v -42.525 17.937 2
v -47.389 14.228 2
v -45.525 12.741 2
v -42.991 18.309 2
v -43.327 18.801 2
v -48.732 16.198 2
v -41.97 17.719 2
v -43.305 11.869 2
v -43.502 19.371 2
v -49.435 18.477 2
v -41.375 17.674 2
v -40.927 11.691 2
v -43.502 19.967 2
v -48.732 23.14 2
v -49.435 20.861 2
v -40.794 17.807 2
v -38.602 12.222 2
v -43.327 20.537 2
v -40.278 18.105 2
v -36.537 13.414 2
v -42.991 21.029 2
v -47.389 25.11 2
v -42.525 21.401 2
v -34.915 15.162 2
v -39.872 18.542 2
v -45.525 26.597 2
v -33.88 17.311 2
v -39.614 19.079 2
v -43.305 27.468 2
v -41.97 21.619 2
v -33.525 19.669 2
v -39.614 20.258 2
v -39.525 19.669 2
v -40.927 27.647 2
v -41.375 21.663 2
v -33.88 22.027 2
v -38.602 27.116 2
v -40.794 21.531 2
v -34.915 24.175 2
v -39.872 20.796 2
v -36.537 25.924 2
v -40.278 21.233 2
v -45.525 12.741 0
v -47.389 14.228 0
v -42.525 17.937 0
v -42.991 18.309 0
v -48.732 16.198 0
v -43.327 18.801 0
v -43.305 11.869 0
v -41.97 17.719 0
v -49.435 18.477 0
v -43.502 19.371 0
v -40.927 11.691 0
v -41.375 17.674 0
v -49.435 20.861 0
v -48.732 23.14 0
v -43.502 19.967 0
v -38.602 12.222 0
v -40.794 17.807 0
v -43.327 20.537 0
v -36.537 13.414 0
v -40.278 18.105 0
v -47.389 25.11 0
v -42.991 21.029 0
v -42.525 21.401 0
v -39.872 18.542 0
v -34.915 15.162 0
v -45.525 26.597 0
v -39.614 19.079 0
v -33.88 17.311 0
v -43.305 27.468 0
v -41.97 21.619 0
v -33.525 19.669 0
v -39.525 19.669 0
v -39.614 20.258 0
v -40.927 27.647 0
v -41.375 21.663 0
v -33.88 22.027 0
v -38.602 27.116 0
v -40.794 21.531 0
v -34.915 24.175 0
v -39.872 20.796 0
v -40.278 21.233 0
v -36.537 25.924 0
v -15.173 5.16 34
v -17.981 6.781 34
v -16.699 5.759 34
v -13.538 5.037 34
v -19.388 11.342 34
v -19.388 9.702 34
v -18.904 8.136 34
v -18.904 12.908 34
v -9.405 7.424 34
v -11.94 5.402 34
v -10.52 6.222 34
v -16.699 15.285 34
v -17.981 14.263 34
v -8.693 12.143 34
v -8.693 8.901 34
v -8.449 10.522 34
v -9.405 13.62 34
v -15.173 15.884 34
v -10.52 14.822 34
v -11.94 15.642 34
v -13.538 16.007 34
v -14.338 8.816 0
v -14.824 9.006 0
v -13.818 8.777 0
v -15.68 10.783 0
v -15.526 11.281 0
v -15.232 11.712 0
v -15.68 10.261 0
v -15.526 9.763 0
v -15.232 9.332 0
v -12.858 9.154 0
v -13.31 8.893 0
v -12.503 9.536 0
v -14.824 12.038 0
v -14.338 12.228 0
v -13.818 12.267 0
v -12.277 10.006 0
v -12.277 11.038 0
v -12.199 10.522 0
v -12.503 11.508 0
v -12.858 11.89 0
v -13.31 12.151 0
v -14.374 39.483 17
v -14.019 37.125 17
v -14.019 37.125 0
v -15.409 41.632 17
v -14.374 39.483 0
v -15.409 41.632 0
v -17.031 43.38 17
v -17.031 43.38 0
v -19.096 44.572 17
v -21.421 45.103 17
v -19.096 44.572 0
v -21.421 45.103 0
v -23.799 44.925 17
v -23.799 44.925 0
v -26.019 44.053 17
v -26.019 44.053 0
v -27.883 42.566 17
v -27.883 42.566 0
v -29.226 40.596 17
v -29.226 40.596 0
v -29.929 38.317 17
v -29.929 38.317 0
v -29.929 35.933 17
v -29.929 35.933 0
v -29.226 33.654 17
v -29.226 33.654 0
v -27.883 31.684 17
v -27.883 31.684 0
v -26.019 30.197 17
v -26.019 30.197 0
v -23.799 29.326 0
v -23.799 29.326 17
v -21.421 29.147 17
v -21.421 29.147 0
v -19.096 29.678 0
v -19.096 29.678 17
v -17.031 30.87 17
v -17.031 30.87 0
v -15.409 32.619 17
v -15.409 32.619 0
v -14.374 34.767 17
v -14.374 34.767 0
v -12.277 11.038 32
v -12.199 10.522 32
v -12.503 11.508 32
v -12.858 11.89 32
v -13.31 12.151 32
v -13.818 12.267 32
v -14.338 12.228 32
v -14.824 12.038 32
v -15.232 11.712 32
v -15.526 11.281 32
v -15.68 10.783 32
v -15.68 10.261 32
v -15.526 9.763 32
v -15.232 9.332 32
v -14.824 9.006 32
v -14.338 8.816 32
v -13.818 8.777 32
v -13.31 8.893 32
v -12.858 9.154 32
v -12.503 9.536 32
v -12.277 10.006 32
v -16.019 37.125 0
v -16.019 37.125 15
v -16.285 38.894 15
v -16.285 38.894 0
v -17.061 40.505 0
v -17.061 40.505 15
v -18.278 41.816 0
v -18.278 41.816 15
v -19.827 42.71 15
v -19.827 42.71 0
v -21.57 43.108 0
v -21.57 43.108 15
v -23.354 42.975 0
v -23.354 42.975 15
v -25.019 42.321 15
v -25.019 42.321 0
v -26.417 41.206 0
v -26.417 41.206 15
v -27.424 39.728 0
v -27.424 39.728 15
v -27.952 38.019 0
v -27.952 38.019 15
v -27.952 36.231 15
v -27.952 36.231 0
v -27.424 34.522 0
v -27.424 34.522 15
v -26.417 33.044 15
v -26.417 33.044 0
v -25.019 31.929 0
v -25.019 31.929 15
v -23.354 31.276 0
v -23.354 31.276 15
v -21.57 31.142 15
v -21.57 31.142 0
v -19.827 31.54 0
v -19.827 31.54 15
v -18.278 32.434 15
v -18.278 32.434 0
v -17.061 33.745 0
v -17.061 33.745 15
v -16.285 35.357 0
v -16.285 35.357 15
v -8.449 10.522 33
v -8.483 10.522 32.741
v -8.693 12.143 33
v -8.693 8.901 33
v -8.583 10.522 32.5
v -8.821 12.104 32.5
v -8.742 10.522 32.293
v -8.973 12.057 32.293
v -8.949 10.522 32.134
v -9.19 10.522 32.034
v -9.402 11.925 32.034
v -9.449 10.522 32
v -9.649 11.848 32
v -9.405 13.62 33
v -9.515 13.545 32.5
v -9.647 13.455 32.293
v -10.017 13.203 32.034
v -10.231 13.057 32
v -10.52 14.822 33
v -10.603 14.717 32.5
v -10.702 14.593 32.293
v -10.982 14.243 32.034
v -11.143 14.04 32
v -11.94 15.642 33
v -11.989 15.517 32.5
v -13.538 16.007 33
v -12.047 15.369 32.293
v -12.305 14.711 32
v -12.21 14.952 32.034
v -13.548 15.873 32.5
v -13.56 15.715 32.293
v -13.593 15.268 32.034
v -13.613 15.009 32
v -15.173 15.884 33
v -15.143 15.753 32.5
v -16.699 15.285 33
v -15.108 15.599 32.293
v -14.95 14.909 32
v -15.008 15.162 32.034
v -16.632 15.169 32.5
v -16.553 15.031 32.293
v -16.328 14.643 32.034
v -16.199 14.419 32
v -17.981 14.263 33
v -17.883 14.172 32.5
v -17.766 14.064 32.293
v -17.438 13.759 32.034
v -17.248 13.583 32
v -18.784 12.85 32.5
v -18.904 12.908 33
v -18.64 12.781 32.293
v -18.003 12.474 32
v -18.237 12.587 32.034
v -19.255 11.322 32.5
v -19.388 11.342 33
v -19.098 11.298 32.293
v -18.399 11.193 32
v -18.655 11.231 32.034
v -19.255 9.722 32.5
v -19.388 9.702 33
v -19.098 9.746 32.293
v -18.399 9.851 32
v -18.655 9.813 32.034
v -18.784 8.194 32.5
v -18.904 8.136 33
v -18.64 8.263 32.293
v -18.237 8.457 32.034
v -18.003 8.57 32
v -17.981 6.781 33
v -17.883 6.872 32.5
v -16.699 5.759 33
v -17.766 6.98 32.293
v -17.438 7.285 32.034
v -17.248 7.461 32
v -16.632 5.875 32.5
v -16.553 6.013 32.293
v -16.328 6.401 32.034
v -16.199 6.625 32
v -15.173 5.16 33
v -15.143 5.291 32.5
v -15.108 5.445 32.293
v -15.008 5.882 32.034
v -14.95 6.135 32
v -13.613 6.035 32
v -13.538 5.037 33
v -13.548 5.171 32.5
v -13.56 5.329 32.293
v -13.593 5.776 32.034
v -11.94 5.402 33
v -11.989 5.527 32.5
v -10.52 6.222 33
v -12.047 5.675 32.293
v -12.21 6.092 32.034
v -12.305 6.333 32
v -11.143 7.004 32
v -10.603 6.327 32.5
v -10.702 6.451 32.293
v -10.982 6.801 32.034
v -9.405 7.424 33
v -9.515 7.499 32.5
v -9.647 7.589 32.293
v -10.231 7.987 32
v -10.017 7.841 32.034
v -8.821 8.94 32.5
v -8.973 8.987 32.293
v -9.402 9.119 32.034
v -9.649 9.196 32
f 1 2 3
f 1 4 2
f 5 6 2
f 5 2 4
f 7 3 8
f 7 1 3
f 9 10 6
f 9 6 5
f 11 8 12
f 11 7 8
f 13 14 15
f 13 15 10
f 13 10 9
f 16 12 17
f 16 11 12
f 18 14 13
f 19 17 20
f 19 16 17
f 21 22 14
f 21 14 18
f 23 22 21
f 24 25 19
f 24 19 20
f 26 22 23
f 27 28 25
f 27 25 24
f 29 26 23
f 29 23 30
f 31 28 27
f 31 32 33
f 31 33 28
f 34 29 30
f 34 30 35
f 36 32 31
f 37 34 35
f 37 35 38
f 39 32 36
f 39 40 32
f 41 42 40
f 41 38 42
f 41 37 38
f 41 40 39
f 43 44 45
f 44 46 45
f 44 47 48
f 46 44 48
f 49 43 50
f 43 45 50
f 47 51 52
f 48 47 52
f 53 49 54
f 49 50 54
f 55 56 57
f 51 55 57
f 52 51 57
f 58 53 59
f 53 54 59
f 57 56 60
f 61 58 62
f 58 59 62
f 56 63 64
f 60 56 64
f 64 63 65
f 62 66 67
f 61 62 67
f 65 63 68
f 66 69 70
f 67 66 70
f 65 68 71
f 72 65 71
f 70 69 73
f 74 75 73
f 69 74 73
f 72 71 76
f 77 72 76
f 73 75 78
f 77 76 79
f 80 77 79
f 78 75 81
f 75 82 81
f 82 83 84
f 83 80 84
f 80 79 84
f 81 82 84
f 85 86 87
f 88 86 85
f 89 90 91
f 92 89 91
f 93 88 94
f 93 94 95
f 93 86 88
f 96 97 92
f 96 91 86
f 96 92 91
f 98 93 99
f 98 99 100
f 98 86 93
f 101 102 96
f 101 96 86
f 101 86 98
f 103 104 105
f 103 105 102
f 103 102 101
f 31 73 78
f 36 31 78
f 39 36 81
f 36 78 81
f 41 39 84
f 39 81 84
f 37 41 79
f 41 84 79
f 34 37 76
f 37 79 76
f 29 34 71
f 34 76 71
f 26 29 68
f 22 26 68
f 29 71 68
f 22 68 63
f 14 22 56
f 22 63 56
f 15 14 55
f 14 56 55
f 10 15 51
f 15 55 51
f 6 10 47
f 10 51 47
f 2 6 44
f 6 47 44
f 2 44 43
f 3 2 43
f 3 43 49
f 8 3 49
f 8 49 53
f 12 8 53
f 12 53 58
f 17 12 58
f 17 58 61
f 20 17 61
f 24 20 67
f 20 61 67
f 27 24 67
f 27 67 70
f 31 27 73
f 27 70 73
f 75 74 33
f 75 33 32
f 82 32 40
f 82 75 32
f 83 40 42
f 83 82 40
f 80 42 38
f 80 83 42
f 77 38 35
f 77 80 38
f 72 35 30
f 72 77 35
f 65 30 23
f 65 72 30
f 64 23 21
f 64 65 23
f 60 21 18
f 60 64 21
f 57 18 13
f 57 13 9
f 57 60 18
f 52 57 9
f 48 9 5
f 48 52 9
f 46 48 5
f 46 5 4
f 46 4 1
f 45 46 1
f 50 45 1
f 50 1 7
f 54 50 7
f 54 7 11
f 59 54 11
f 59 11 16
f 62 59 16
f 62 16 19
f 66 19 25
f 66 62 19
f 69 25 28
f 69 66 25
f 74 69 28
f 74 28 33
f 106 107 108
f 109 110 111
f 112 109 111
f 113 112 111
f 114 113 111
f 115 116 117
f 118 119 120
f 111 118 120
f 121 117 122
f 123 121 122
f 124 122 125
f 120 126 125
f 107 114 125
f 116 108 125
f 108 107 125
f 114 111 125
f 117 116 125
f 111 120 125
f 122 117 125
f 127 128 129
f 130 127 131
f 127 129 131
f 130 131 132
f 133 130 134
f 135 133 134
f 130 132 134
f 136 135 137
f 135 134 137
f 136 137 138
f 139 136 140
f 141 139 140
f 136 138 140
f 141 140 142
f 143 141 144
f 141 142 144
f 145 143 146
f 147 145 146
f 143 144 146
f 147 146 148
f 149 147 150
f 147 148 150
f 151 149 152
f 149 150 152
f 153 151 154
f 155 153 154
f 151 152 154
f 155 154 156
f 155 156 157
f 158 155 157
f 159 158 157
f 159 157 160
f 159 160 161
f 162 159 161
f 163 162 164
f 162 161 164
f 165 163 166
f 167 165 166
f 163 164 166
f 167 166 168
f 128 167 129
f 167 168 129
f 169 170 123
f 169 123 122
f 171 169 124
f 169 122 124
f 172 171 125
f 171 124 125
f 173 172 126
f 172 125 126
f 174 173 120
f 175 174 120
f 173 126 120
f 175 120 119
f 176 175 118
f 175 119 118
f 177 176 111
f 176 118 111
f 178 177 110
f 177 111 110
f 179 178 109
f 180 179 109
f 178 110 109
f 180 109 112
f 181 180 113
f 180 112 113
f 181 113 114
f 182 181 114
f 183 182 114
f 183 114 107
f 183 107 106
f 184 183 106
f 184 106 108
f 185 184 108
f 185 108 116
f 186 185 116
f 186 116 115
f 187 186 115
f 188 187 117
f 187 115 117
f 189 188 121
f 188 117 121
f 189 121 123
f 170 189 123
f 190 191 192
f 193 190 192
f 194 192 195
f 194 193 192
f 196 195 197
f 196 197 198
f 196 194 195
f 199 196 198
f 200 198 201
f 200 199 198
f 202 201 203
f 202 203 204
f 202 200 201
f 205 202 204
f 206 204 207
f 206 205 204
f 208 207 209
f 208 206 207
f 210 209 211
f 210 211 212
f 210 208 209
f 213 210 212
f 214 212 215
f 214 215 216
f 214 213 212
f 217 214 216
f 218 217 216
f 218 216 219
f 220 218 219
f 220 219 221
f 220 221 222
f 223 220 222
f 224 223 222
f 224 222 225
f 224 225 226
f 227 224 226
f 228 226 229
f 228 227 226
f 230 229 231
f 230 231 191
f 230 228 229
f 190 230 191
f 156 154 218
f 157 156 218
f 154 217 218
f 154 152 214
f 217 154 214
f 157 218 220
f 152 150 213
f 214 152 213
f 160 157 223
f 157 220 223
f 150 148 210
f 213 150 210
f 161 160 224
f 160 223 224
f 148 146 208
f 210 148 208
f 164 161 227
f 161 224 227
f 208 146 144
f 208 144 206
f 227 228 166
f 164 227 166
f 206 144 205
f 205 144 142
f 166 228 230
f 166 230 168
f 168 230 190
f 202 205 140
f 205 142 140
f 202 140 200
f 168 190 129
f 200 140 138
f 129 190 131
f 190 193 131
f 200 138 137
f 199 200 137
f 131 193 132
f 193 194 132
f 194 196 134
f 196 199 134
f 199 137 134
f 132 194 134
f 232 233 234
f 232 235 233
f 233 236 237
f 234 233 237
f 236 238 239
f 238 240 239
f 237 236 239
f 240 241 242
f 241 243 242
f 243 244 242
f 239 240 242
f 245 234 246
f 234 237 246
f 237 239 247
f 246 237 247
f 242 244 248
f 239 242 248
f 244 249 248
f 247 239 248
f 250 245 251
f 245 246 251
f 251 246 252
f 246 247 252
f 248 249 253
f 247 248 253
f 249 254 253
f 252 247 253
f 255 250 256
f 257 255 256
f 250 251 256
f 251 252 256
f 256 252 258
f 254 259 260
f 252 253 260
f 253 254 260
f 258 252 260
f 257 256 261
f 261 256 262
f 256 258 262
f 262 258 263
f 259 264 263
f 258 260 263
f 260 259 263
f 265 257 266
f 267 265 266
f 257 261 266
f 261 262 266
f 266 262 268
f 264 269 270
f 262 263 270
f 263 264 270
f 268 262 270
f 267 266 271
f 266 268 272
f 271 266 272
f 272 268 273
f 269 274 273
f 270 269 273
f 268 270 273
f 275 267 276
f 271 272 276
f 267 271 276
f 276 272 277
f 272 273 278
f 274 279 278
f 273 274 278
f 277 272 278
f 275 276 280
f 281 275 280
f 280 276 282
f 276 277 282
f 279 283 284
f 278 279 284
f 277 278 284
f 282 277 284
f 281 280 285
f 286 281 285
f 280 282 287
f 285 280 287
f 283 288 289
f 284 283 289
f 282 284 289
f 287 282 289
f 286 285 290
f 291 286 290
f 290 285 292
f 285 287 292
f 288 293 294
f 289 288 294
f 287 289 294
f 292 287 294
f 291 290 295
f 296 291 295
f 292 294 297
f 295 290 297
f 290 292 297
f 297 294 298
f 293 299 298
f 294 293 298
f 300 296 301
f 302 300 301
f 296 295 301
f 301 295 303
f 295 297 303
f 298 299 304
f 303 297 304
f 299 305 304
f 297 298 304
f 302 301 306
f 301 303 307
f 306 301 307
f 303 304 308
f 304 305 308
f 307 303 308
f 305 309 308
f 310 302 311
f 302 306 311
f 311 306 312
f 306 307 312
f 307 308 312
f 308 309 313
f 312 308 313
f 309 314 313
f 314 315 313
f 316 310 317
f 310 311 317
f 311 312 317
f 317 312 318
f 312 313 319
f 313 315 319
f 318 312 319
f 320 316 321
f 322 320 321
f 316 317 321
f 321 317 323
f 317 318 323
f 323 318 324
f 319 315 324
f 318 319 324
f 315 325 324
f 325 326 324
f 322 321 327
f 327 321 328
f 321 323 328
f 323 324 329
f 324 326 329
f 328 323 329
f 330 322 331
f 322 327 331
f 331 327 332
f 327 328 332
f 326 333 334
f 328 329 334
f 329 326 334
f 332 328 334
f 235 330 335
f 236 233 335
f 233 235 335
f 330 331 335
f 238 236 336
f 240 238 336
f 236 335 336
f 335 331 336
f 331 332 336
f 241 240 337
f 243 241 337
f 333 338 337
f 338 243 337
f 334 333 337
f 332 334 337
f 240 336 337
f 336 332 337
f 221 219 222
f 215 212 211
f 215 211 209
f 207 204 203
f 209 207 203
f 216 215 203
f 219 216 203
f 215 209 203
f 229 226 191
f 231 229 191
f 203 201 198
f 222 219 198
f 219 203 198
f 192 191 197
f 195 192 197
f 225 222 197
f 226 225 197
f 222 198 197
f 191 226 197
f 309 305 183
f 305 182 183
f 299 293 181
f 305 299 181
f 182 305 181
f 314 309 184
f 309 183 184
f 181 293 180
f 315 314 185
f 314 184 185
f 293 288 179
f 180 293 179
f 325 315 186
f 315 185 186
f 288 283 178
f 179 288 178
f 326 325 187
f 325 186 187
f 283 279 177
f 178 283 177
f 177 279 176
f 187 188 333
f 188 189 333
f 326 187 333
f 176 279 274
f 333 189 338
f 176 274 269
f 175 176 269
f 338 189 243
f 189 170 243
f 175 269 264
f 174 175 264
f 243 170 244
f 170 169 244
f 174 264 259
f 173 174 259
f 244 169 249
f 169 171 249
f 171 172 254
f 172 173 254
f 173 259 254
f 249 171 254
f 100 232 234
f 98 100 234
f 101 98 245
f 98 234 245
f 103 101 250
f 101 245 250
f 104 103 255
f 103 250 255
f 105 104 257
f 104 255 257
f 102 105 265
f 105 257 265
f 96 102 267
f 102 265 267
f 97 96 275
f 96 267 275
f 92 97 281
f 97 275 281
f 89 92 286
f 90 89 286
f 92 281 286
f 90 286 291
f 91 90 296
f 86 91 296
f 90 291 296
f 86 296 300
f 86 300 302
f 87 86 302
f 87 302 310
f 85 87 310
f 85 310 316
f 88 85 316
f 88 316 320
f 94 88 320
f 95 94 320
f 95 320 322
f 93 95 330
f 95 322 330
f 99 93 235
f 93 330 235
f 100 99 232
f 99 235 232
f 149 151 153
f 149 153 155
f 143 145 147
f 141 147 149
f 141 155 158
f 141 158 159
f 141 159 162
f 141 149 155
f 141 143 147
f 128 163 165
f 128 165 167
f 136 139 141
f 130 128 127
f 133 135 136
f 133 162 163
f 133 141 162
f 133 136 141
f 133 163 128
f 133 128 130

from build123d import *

# Parameters (mm, degrees)
F0_R     = 8
F0_R_2   = 2
F1_DEPTH = 2
F2_R     = 8
F2_R_2   = 6
F3_DEPTH = 15
F4_R     = 8
F5_DEPTH = 2
F6_R     = 1.75
F7_DEPTH = 32
F8_R     = 5.5
F9_DEPTH = 2
F10_R    = 1


with BuildPart() as f1:
    # F0 (on Top) → F1 (new body)
    with BuildSketch(Plane.XY):
        with Locations((-41.524723, 19.668885)):
            Circle(F0_R)
        with Locations((-41.524723, 19.668885)):
            Circle(F0_R_2, mode=Mode.SUBTRACT)
    extrude(amount=F1_DEPTH)


with BuildPart() as f3:
    # F2 (on Top) → F3 (new body)
    with BuildSketch(Plane.XY):
        with Locations((-22.018656, 37.125103)):
            Circle(F2_R)
        with Locations((-22.018656, 37.125103)):
            Circle(F2_R_2, mode=Mode.SUBTRACT)
    extrude(amount=F3_DEPTH)

    # F4 (on face) → F5 (join)
    with BuildSketch(Plane.XY.offset(15)):
        with Locations((-22.018656, 37.125103)):
            Circle(F4_R)
    extrude(amount=F5_DEPTH)


with BuildPart() as f7:
    # F6 (on Top) → F7 (new body)
    with BuildSketch(Plane.XY):
        with Locations((-13.949047, 10.522005)):
            Circle(F6_R)
    extrude(amount=F7_DEPTH)

    # F8 (on face) → F9 (join)
    with BuildSketch(Plane.XY.offset(32)):
        with Locations((-13.949047, 10.522005)):
            Circle(F8_R)
    extrude(amount=F9_DEPTH)

    # F10
    f10_edges = [f7.edges().sort_by_distance(p)[0] for p in [
        (-19.449047, 10.522005, 32),
    ]]
    fillet(f10_edges, radius=F10_R)


solid = Compound([f1.part, f3.part, f7.part])
